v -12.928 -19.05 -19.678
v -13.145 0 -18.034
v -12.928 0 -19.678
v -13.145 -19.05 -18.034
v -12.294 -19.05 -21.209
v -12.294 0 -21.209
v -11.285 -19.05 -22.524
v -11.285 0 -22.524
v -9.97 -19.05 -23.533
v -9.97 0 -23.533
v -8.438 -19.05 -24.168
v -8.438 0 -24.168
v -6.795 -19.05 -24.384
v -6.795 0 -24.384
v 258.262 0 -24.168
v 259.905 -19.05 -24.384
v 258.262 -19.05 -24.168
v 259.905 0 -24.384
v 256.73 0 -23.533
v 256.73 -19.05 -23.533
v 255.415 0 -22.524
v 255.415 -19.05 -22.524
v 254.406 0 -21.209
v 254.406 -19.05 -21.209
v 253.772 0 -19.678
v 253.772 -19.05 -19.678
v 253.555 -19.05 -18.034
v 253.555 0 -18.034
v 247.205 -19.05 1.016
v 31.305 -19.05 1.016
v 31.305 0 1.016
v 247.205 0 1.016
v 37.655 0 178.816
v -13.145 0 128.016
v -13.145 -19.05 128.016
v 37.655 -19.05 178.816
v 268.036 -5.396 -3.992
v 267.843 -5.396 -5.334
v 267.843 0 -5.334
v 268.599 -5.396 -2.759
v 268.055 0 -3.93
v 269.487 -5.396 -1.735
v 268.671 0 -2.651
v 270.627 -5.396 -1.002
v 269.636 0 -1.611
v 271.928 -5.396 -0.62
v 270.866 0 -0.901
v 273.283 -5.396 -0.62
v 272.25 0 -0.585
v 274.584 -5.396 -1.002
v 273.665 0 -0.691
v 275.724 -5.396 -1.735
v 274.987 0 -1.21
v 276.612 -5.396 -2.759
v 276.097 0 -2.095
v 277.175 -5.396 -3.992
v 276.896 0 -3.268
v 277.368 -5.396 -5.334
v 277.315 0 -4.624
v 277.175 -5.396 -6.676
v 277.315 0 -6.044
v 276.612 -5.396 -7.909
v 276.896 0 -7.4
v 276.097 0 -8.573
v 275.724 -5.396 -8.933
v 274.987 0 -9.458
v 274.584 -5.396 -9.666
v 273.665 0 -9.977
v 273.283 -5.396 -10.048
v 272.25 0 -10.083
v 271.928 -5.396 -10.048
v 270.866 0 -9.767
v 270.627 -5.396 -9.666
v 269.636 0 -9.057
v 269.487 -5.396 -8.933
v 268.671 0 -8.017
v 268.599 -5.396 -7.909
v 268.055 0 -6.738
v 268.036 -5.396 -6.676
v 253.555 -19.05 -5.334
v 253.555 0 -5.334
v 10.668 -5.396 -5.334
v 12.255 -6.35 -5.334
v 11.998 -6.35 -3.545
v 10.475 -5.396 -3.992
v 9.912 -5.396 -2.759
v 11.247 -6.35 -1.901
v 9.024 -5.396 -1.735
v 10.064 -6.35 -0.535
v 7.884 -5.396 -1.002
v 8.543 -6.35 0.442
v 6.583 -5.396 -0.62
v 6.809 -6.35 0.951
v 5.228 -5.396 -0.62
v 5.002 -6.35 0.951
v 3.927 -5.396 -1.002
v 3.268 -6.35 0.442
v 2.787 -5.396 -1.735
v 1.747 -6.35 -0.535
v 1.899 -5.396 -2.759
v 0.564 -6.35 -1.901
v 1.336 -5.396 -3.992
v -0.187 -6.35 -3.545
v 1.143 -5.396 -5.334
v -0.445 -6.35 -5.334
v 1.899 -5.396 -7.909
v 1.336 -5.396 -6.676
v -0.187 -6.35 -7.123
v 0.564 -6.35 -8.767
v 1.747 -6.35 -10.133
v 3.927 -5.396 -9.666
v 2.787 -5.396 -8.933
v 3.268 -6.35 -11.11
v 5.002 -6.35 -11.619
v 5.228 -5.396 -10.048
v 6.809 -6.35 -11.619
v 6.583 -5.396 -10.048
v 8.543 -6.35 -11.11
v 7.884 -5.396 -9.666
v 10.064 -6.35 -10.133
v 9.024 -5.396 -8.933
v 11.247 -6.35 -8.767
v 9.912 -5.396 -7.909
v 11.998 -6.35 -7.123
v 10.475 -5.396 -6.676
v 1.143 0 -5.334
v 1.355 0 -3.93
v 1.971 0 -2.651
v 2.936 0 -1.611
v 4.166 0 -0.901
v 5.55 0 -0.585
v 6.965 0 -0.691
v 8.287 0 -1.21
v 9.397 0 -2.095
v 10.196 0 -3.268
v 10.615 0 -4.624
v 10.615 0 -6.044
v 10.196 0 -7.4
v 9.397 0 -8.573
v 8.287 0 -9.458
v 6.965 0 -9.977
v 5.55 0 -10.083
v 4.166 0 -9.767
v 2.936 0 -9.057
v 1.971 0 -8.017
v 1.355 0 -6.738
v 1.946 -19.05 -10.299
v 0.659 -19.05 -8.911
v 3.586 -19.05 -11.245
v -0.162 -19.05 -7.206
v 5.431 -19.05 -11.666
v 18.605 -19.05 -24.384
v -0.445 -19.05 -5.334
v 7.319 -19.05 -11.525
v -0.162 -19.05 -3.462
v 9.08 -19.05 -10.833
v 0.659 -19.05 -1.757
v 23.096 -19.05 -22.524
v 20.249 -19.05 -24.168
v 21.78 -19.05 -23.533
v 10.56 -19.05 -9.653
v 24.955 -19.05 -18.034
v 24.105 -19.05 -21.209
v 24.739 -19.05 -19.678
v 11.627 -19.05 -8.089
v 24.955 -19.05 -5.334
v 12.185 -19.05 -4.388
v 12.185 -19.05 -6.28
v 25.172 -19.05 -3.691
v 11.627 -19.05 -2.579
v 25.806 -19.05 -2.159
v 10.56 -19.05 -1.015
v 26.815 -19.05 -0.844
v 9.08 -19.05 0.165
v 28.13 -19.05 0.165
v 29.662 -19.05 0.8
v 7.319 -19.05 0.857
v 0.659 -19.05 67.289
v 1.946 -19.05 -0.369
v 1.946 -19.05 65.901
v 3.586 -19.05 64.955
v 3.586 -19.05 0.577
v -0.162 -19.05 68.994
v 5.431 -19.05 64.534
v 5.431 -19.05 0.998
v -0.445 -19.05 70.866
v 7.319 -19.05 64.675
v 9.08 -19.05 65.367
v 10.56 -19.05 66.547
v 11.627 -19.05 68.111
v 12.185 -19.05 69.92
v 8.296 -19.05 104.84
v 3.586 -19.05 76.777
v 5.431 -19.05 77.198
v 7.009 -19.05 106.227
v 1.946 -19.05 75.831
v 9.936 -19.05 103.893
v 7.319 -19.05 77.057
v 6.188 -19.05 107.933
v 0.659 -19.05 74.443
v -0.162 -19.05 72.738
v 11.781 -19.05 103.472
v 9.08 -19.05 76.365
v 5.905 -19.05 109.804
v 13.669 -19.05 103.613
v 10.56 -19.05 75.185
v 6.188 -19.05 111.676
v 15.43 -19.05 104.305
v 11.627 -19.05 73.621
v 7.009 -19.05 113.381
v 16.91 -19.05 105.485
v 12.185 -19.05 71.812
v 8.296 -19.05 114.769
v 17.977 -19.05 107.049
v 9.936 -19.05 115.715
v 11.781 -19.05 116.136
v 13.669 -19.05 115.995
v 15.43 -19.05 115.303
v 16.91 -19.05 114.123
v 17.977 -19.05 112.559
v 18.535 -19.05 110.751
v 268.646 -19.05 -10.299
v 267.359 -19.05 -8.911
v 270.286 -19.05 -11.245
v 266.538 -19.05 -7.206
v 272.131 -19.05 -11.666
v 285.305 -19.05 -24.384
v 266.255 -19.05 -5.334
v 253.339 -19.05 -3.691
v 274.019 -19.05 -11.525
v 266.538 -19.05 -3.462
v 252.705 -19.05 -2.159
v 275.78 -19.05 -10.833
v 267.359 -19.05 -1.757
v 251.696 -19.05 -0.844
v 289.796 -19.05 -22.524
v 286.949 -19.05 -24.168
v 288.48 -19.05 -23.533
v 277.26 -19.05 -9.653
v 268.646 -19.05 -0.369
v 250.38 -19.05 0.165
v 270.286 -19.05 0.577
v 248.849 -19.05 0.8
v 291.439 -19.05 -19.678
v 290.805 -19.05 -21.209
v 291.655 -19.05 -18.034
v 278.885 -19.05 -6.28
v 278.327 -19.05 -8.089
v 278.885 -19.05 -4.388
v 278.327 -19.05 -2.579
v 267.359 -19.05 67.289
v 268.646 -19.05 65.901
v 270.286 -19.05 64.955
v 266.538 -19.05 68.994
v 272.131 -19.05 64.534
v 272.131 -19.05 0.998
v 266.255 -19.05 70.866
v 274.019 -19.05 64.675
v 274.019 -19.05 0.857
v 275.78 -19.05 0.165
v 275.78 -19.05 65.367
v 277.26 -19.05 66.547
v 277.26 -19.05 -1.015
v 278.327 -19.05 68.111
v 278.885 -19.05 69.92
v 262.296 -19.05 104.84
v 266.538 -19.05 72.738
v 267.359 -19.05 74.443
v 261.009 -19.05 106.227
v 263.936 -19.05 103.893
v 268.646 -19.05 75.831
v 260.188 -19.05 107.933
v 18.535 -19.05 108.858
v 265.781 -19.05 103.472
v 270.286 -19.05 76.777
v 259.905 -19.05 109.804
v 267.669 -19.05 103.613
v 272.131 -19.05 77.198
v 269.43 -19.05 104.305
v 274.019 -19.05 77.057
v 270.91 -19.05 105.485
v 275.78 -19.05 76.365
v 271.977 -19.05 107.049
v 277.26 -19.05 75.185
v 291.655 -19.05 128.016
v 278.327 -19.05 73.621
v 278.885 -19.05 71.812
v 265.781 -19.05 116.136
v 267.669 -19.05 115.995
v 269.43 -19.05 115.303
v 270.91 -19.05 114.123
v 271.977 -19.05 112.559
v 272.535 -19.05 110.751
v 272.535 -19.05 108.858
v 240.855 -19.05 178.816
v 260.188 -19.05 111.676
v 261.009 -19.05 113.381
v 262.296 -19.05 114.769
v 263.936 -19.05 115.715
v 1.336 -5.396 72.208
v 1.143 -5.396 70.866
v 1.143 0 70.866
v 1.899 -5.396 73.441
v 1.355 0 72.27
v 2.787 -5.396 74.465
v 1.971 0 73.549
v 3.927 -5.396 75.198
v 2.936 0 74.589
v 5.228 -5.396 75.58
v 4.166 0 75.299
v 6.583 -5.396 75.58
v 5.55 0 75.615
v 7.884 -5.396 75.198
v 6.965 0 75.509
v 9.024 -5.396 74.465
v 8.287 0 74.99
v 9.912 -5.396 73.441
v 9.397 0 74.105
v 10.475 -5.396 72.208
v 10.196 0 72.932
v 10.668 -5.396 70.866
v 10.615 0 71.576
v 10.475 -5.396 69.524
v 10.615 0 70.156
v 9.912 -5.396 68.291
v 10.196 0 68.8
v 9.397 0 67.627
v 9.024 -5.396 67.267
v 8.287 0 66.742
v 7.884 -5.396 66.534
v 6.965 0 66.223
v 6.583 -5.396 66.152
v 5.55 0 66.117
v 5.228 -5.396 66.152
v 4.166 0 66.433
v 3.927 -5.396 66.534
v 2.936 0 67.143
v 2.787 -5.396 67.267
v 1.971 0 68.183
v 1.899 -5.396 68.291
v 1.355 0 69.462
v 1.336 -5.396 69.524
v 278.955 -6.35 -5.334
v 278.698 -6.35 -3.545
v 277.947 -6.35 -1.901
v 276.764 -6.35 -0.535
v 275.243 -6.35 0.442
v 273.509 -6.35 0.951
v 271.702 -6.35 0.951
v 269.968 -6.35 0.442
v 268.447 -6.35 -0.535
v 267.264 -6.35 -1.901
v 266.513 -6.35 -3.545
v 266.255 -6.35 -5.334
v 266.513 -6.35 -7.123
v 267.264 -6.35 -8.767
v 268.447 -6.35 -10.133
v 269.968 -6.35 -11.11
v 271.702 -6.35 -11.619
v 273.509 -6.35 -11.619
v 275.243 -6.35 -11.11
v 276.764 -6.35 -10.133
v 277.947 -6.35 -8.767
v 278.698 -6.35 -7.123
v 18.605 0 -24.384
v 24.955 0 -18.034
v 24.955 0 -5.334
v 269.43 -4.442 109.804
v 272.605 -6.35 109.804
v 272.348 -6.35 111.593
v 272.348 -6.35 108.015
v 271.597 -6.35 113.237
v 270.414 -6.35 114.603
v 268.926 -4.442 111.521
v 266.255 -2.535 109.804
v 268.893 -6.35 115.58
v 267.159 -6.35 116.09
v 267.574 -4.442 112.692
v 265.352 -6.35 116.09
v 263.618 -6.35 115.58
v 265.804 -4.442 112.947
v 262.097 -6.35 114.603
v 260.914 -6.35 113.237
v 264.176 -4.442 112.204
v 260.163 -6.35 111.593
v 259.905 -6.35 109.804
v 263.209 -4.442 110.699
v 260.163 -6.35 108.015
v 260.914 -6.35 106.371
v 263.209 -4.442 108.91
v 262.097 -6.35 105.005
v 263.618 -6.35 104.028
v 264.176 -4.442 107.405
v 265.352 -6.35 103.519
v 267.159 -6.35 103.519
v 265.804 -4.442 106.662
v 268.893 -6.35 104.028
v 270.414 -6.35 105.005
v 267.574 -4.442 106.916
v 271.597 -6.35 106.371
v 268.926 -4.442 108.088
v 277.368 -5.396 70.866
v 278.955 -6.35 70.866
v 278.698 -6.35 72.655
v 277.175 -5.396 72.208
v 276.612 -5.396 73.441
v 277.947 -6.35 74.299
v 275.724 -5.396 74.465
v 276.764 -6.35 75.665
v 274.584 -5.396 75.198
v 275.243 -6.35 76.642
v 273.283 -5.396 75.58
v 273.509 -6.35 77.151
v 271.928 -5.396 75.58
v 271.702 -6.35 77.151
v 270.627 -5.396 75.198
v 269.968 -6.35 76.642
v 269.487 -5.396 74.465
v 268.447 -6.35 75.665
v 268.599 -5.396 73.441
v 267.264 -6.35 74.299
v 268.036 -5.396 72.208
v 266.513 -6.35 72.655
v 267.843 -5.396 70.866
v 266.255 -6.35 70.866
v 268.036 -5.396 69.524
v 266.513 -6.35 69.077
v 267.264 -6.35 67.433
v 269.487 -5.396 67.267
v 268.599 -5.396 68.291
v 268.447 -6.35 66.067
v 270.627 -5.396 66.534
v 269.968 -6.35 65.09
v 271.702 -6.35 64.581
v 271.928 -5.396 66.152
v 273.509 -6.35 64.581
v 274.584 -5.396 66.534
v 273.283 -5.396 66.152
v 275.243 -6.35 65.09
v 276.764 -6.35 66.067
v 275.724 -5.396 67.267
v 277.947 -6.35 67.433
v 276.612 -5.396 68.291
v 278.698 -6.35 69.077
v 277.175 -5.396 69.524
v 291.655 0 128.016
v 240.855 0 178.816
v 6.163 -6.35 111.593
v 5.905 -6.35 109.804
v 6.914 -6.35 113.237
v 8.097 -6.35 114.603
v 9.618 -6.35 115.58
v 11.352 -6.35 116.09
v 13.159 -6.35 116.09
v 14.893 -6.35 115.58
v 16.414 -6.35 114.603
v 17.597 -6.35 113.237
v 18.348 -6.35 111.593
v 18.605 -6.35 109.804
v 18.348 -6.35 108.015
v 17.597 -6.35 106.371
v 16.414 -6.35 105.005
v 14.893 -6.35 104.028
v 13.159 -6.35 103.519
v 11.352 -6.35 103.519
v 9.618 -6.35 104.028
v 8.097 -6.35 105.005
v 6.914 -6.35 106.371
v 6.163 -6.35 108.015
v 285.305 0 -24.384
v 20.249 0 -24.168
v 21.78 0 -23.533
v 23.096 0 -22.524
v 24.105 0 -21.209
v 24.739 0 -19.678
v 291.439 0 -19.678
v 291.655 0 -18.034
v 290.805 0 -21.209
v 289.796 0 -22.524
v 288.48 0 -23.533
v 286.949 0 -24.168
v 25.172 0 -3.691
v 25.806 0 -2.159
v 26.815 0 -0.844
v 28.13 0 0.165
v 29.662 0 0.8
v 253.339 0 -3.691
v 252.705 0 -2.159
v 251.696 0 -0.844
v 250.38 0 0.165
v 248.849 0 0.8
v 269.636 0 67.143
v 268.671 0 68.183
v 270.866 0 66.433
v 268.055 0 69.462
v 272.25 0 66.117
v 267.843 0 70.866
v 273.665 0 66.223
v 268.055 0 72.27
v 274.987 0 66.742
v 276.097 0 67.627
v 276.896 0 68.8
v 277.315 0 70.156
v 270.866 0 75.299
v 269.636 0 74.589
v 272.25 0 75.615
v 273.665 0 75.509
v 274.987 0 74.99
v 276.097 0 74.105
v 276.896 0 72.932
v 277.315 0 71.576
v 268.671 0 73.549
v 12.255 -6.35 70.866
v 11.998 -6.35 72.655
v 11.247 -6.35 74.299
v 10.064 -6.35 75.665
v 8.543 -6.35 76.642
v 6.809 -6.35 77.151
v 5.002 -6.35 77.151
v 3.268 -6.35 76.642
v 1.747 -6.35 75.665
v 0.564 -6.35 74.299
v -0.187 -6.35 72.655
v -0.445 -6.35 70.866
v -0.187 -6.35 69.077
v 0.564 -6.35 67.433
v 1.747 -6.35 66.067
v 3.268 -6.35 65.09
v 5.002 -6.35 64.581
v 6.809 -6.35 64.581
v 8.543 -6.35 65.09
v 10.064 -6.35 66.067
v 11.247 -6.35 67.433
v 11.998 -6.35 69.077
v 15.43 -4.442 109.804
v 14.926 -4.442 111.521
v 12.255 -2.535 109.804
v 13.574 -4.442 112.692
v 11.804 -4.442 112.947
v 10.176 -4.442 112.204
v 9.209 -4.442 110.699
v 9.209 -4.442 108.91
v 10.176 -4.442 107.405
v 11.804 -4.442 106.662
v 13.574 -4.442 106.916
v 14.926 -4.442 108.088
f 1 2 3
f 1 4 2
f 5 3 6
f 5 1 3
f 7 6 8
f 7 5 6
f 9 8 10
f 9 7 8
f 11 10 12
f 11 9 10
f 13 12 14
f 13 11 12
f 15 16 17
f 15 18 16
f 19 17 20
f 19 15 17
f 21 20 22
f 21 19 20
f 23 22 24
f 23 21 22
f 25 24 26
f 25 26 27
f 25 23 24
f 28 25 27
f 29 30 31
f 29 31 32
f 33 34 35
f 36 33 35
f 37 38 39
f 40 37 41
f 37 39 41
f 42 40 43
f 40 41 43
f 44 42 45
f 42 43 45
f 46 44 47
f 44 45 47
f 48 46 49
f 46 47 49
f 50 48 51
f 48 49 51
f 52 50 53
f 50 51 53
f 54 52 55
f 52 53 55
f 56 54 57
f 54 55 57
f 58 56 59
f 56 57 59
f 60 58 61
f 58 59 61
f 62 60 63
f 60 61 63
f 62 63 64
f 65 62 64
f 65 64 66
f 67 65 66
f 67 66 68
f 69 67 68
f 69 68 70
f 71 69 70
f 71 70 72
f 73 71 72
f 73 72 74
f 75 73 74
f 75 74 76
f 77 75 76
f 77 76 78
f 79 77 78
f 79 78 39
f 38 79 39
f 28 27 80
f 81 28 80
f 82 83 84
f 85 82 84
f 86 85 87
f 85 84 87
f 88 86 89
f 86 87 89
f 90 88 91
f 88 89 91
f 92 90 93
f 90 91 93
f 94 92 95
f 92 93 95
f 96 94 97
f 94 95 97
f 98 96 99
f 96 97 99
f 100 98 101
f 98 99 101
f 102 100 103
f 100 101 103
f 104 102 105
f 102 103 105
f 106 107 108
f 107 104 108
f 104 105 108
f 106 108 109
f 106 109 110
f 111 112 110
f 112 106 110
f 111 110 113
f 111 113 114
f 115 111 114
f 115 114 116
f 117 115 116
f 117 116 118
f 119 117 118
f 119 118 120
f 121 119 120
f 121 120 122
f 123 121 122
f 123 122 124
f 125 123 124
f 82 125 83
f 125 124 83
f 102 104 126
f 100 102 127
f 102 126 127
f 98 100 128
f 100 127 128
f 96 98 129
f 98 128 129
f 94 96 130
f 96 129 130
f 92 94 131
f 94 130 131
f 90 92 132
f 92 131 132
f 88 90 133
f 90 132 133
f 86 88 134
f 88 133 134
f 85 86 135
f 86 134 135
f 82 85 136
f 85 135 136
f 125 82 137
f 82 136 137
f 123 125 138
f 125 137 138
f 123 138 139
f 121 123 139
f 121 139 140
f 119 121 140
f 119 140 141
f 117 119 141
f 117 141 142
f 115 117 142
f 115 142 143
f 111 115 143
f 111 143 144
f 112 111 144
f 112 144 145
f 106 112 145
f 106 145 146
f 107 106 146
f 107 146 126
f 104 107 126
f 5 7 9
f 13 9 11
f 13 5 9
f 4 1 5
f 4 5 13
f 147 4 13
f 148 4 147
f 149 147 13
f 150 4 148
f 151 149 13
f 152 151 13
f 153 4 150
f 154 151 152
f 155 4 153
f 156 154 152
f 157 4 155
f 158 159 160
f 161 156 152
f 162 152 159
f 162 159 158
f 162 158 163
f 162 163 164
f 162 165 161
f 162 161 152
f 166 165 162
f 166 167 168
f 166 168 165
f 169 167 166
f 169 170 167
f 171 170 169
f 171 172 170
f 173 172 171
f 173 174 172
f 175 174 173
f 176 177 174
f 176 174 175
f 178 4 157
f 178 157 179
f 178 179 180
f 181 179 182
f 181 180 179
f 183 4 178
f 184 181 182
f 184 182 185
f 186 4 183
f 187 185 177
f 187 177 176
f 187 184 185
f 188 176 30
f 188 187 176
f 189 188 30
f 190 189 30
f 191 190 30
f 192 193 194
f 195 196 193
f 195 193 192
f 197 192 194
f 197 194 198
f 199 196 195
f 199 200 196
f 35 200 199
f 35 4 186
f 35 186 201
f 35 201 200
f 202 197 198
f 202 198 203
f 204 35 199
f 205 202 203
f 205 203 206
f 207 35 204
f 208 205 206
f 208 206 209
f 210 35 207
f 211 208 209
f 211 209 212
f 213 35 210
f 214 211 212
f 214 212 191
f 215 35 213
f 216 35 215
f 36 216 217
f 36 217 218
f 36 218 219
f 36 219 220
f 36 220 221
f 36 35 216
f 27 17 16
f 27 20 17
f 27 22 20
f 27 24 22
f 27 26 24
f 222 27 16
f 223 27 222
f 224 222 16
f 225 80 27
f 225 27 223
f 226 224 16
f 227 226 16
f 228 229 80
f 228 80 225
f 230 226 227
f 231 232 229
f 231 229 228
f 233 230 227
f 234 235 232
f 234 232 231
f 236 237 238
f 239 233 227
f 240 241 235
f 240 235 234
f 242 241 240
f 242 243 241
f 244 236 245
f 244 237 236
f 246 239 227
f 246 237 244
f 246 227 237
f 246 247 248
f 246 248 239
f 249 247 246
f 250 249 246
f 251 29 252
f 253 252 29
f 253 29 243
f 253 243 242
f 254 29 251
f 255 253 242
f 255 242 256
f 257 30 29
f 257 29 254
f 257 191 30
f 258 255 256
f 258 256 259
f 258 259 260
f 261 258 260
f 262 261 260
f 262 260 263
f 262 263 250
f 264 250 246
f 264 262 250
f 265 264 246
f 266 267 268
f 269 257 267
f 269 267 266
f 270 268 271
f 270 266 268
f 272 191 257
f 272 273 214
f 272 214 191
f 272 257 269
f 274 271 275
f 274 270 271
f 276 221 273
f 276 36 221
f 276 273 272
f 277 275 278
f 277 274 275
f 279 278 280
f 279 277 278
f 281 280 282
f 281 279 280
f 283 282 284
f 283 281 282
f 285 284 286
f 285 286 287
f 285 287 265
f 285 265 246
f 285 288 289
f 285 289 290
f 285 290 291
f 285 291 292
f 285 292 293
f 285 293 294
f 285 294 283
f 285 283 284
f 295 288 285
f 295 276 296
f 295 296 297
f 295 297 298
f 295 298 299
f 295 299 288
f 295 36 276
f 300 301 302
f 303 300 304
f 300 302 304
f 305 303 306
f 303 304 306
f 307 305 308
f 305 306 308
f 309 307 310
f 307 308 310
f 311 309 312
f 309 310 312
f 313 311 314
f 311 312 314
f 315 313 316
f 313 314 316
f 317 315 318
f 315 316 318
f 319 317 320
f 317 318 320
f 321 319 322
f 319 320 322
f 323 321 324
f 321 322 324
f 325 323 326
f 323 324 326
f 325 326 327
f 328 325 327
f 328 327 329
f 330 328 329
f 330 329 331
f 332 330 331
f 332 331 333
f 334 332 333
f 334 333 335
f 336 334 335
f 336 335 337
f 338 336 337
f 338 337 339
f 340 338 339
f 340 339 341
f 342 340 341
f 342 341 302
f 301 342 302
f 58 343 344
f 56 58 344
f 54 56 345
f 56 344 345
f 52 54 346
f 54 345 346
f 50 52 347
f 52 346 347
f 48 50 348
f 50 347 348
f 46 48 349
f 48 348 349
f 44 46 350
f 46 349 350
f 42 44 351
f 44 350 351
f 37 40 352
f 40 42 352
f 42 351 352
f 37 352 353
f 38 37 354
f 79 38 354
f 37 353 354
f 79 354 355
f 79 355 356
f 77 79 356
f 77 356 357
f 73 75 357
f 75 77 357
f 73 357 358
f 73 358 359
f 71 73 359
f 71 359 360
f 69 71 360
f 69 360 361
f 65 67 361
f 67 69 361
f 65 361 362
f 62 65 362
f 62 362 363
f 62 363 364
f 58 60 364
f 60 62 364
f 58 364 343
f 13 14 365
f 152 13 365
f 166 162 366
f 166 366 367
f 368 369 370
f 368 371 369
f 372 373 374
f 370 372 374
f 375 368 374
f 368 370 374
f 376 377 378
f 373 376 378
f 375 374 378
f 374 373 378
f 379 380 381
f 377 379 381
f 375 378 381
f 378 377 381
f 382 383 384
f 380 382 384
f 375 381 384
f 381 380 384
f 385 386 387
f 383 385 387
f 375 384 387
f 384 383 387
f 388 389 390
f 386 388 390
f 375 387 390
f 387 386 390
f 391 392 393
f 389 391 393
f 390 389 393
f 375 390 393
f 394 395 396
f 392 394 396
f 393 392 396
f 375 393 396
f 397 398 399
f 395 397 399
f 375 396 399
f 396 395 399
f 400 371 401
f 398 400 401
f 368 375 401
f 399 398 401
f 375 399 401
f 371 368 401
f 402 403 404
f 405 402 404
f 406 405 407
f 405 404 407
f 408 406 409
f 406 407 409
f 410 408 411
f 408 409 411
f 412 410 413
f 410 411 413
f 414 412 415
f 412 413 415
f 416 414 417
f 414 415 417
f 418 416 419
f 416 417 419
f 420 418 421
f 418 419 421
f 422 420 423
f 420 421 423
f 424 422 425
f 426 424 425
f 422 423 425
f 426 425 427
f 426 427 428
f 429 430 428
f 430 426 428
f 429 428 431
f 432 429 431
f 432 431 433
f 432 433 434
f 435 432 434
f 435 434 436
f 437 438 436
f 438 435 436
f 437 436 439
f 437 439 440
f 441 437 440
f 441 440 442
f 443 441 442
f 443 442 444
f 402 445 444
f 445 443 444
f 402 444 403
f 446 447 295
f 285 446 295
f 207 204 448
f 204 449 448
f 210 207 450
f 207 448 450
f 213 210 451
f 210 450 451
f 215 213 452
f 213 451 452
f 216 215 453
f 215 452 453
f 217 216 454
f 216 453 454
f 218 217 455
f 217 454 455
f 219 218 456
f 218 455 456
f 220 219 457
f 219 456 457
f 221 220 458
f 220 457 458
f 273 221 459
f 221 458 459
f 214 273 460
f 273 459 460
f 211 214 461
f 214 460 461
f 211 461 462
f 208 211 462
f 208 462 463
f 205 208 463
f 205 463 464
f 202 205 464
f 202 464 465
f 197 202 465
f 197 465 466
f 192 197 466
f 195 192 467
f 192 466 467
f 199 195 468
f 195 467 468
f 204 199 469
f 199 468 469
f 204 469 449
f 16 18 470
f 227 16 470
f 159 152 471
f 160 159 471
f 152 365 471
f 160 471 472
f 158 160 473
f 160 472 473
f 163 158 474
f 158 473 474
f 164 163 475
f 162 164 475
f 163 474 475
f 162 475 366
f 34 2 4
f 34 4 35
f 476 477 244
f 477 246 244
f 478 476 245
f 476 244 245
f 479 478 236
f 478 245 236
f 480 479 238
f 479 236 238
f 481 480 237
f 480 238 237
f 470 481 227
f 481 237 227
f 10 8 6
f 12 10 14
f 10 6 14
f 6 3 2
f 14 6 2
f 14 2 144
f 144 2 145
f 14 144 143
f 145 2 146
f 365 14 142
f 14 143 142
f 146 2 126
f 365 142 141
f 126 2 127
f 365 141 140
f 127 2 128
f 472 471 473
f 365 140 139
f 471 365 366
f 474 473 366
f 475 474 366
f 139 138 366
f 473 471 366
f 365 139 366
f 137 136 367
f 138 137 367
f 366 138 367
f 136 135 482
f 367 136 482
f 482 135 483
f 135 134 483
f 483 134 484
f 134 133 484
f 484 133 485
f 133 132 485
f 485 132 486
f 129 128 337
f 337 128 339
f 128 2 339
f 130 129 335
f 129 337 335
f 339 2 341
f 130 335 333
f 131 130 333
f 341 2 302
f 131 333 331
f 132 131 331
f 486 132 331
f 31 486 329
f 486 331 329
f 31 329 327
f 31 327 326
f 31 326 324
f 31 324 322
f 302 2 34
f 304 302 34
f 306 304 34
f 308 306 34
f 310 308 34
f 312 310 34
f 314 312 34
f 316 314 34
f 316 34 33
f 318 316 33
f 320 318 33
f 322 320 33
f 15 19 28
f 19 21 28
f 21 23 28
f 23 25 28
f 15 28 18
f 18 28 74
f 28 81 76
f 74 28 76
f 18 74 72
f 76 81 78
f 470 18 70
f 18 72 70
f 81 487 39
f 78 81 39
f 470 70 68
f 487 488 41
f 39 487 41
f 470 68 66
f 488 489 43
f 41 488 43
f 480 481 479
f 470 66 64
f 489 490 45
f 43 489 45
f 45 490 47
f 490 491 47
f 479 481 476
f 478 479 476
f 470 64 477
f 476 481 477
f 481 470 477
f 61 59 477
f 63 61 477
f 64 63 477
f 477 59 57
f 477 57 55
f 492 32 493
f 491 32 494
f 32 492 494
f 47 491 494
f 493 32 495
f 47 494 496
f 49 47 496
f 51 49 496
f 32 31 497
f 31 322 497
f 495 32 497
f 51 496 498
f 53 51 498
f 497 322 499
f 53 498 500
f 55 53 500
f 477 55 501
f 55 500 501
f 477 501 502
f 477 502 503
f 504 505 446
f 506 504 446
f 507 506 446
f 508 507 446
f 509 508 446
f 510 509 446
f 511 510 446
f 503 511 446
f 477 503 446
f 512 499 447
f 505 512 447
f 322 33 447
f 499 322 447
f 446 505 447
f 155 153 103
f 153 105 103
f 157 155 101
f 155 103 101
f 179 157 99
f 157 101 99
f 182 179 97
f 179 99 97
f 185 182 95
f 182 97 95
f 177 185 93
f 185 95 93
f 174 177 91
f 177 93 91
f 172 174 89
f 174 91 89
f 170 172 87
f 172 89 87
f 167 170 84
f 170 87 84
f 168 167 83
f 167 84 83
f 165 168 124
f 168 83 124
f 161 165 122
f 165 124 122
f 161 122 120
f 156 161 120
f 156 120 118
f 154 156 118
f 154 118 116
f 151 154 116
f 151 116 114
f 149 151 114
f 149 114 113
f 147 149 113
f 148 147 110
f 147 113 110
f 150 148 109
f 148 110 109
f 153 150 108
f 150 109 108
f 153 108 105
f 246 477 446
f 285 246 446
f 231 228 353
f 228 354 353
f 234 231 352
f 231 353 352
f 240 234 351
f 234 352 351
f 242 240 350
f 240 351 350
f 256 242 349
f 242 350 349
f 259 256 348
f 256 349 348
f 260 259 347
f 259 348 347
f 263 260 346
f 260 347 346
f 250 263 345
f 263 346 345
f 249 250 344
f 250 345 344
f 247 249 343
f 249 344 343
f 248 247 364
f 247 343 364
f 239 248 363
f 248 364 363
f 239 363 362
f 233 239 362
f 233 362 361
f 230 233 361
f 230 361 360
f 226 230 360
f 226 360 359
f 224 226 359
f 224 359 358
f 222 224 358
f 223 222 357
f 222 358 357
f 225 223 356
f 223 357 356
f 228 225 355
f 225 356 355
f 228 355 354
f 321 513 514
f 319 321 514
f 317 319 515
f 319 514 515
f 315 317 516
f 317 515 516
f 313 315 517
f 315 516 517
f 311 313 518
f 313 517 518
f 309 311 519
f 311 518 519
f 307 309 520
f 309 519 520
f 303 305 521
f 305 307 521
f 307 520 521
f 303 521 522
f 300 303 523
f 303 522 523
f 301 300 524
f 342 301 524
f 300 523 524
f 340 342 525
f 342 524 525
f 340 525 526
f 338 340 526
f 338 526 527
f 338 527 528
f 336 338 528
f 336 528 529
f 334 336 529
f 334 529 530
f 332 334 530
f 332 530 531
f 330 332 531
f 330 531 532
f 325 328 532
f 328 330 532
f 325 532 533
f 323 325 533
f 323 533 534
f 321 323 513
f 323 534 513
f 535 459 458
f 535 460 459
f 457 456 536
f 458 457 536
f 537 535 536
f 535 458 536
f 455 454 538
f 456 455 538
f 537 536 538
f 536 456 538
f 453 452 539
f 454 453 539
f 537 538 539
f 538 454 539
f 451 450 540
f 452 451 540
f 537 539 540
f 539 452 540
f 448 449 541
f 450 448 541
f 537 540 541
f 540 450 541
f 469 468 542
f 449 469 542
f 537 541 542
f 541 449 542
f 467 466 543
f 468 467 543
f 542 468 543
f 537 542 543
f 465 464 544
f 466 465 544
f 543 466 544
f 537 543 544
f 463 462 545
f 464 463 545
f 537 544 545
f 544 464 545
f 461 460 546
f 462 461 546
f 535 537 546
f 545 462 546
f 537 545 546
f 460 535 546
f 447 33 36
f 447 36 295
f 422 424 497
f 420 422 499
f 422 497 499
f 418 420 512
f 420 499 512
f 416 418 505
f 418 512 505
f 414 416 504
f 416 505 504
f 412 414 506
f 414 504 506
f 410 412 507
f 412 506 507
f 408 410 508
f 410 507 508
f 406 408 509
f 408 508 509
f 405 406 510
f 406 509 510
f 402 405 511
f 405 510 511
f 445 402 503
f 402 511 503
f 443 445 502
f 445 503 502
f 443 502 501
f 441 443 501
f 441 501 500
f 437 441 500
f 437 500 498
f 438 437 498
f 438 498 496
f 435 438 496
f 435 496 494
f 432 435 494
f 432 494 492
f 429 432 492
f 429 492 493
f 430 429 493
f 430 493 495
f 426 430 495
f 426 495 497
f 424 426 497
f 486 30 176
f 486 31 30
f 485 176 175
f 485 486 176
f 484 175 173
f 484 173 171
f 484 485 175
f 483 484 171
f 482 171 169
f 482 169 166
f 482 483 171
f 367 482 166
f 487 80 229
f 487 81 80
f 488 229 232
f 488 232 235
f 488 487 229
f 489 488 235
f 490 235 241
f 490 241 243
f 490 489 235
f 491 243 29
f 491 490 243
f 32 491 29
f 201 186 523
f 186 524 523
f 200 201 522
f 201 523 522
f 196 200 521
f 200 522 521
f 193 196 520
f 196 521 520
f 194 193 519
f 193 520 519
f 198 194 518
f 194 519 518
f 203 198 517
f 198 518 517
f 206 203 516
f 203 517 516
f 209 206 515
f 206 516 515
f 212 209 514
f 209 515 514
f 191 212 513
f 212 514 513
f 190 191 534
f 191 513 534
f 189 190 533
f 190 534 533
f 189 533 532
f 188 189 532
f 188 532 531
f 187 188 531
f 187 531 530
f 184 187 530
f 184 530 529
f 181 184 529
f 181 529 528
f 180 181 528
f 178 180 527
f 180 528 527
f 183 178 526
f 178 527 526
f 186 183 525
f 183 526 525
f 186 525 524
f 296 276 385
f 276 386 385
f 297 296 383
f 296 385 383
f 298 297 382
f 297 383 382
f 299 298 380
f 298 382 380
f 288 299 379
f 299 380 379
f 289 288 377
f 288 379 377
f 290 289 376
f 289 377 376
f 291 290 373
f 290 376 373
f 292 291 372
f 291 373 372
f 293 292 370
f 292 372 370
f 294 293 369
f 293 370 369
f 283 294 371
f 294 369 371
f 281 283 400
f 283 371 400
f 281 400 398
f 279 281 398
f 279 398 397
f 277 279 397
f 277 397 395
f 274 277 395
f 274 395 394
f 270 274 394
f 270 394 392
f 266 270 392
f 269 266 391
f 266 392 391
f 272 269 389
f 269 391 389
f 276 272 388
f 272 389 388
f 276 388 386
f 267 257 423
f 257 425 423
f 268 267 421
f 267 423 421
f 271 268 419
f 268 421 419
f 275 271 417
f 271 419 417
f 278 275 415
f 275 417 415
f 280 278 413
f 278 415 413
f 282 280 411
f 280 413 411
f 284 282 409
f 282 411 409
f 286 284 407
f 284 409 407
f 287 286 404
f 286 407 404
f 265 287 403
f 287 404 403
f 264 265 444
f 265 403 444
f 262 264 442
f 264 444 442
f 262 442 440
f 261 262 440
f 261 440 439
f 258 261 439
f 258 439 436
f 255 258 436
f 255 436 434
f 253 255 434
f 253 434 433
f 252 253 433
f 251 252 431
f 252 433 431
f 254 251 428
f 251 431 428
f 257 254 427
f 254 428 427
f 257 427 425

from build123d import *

# Parameters (mm, degrees)
F0_W     = 304.8
F0_H     = 203.2
F1_DEPTH = 19.05
F2_SIZE  = 50.8
F3_W     = 228.6
F3_H     = 25.4
F4_DEPTH = 19.05
F5_R     = 6.35
F7_D     = 12.7
F7_DEPTH = 12.7
F7_TIP   = 3.8154649308
F8_D     = 12.7
F8_DEPTH = 12.7
F8_TIP   = 3.8154649308
F9_D     = 9.525


with BuildPart() as f1:
    # F0 (on Front) → F1 (new body)
    with BuildSketch(Plane.XZ):
        with Locations((139.2554994464, 77.2159987301)):
            Rectangle(F0_W, F0_H)
    extrude(amount=F1_DEPTH)

    # F2
    f2_edges = [f1.edges().sort_by_distance(p)[0] for p in [
        (-13.144501, -9.525, 178.815999),
        (291.655499, -9.525, 178.815999),
    ]]
    chamfer(f2_edges, length=F2_SIZE)

    # F3 (on face) → F4 (cut)
    with BuildSketch(Plane.XZ.offset(19.05)):
        with Locations((139.2554994464, -11.6840012699)):
            Rectangle(F3_W, F3_H)
    extrude(amount=-F4_DEPTH, mode=Mode.SUBTRACT)

    # F5
    f5_edges = [f1.edges().sort_by_distance(p)[0] for p in [
        (24.955499, -9.525, 1.015999),
        (253.555499, -9.525, 1.015999),
        (253.555499, -9.525, -24.384001),
        (291.655499, -9.525, -24.384001),
        (24.955499, -9.525, -24.384001),
        (-13.144501, -9.525, -24.384001),
    ]]
    fillet(f5_edges, radius=F5_R)

    # F7
    with Locations(Plane.XZ.offset(19.05)):
        with Locations((12.2554994464, 109.8041987301), (266.2554994464, 109.8041987301)):
            Hole(F7_D / 2, depth=F7_DEPTH)
            with Locations((0, 0, -(F7_DEPTH + F7_TIP / 2))):  # 118° drill point
                Cone(0, F7_D / 2, F7_TIP, mode=Mode.SUBTRACT)

    # F8
    with Locations(Plane.XZ.offset(19.05)):
        with Locations((272.6054994464, 70.8659987301), (5.9054994464, 70.8659987301), (5.9054994464, -5.3340012699), (272.6054994464, -5.3340012699)):
            Hole(F8_D / 2, depth=F8_DEPTH)
            with Locations((0, 0, -(F8_DEPTH + F8_TIP / 2))):  # 118° drill point
                Cone(0, F8_D / 2, F8_TIP, mode=Mode.SUBTRACT)

    # F9 (through all)
    with Locations(Plane.XZ.offset(19.05)):
        with Locations((5.9054994464, 70.8659987301), (272.6054994464, 70.8659987301), (5.9054994464, -5.3340012699), (272.6054994464, -5.3340012699)):
            Hole(F9_D / 2)


solid = f1.part
